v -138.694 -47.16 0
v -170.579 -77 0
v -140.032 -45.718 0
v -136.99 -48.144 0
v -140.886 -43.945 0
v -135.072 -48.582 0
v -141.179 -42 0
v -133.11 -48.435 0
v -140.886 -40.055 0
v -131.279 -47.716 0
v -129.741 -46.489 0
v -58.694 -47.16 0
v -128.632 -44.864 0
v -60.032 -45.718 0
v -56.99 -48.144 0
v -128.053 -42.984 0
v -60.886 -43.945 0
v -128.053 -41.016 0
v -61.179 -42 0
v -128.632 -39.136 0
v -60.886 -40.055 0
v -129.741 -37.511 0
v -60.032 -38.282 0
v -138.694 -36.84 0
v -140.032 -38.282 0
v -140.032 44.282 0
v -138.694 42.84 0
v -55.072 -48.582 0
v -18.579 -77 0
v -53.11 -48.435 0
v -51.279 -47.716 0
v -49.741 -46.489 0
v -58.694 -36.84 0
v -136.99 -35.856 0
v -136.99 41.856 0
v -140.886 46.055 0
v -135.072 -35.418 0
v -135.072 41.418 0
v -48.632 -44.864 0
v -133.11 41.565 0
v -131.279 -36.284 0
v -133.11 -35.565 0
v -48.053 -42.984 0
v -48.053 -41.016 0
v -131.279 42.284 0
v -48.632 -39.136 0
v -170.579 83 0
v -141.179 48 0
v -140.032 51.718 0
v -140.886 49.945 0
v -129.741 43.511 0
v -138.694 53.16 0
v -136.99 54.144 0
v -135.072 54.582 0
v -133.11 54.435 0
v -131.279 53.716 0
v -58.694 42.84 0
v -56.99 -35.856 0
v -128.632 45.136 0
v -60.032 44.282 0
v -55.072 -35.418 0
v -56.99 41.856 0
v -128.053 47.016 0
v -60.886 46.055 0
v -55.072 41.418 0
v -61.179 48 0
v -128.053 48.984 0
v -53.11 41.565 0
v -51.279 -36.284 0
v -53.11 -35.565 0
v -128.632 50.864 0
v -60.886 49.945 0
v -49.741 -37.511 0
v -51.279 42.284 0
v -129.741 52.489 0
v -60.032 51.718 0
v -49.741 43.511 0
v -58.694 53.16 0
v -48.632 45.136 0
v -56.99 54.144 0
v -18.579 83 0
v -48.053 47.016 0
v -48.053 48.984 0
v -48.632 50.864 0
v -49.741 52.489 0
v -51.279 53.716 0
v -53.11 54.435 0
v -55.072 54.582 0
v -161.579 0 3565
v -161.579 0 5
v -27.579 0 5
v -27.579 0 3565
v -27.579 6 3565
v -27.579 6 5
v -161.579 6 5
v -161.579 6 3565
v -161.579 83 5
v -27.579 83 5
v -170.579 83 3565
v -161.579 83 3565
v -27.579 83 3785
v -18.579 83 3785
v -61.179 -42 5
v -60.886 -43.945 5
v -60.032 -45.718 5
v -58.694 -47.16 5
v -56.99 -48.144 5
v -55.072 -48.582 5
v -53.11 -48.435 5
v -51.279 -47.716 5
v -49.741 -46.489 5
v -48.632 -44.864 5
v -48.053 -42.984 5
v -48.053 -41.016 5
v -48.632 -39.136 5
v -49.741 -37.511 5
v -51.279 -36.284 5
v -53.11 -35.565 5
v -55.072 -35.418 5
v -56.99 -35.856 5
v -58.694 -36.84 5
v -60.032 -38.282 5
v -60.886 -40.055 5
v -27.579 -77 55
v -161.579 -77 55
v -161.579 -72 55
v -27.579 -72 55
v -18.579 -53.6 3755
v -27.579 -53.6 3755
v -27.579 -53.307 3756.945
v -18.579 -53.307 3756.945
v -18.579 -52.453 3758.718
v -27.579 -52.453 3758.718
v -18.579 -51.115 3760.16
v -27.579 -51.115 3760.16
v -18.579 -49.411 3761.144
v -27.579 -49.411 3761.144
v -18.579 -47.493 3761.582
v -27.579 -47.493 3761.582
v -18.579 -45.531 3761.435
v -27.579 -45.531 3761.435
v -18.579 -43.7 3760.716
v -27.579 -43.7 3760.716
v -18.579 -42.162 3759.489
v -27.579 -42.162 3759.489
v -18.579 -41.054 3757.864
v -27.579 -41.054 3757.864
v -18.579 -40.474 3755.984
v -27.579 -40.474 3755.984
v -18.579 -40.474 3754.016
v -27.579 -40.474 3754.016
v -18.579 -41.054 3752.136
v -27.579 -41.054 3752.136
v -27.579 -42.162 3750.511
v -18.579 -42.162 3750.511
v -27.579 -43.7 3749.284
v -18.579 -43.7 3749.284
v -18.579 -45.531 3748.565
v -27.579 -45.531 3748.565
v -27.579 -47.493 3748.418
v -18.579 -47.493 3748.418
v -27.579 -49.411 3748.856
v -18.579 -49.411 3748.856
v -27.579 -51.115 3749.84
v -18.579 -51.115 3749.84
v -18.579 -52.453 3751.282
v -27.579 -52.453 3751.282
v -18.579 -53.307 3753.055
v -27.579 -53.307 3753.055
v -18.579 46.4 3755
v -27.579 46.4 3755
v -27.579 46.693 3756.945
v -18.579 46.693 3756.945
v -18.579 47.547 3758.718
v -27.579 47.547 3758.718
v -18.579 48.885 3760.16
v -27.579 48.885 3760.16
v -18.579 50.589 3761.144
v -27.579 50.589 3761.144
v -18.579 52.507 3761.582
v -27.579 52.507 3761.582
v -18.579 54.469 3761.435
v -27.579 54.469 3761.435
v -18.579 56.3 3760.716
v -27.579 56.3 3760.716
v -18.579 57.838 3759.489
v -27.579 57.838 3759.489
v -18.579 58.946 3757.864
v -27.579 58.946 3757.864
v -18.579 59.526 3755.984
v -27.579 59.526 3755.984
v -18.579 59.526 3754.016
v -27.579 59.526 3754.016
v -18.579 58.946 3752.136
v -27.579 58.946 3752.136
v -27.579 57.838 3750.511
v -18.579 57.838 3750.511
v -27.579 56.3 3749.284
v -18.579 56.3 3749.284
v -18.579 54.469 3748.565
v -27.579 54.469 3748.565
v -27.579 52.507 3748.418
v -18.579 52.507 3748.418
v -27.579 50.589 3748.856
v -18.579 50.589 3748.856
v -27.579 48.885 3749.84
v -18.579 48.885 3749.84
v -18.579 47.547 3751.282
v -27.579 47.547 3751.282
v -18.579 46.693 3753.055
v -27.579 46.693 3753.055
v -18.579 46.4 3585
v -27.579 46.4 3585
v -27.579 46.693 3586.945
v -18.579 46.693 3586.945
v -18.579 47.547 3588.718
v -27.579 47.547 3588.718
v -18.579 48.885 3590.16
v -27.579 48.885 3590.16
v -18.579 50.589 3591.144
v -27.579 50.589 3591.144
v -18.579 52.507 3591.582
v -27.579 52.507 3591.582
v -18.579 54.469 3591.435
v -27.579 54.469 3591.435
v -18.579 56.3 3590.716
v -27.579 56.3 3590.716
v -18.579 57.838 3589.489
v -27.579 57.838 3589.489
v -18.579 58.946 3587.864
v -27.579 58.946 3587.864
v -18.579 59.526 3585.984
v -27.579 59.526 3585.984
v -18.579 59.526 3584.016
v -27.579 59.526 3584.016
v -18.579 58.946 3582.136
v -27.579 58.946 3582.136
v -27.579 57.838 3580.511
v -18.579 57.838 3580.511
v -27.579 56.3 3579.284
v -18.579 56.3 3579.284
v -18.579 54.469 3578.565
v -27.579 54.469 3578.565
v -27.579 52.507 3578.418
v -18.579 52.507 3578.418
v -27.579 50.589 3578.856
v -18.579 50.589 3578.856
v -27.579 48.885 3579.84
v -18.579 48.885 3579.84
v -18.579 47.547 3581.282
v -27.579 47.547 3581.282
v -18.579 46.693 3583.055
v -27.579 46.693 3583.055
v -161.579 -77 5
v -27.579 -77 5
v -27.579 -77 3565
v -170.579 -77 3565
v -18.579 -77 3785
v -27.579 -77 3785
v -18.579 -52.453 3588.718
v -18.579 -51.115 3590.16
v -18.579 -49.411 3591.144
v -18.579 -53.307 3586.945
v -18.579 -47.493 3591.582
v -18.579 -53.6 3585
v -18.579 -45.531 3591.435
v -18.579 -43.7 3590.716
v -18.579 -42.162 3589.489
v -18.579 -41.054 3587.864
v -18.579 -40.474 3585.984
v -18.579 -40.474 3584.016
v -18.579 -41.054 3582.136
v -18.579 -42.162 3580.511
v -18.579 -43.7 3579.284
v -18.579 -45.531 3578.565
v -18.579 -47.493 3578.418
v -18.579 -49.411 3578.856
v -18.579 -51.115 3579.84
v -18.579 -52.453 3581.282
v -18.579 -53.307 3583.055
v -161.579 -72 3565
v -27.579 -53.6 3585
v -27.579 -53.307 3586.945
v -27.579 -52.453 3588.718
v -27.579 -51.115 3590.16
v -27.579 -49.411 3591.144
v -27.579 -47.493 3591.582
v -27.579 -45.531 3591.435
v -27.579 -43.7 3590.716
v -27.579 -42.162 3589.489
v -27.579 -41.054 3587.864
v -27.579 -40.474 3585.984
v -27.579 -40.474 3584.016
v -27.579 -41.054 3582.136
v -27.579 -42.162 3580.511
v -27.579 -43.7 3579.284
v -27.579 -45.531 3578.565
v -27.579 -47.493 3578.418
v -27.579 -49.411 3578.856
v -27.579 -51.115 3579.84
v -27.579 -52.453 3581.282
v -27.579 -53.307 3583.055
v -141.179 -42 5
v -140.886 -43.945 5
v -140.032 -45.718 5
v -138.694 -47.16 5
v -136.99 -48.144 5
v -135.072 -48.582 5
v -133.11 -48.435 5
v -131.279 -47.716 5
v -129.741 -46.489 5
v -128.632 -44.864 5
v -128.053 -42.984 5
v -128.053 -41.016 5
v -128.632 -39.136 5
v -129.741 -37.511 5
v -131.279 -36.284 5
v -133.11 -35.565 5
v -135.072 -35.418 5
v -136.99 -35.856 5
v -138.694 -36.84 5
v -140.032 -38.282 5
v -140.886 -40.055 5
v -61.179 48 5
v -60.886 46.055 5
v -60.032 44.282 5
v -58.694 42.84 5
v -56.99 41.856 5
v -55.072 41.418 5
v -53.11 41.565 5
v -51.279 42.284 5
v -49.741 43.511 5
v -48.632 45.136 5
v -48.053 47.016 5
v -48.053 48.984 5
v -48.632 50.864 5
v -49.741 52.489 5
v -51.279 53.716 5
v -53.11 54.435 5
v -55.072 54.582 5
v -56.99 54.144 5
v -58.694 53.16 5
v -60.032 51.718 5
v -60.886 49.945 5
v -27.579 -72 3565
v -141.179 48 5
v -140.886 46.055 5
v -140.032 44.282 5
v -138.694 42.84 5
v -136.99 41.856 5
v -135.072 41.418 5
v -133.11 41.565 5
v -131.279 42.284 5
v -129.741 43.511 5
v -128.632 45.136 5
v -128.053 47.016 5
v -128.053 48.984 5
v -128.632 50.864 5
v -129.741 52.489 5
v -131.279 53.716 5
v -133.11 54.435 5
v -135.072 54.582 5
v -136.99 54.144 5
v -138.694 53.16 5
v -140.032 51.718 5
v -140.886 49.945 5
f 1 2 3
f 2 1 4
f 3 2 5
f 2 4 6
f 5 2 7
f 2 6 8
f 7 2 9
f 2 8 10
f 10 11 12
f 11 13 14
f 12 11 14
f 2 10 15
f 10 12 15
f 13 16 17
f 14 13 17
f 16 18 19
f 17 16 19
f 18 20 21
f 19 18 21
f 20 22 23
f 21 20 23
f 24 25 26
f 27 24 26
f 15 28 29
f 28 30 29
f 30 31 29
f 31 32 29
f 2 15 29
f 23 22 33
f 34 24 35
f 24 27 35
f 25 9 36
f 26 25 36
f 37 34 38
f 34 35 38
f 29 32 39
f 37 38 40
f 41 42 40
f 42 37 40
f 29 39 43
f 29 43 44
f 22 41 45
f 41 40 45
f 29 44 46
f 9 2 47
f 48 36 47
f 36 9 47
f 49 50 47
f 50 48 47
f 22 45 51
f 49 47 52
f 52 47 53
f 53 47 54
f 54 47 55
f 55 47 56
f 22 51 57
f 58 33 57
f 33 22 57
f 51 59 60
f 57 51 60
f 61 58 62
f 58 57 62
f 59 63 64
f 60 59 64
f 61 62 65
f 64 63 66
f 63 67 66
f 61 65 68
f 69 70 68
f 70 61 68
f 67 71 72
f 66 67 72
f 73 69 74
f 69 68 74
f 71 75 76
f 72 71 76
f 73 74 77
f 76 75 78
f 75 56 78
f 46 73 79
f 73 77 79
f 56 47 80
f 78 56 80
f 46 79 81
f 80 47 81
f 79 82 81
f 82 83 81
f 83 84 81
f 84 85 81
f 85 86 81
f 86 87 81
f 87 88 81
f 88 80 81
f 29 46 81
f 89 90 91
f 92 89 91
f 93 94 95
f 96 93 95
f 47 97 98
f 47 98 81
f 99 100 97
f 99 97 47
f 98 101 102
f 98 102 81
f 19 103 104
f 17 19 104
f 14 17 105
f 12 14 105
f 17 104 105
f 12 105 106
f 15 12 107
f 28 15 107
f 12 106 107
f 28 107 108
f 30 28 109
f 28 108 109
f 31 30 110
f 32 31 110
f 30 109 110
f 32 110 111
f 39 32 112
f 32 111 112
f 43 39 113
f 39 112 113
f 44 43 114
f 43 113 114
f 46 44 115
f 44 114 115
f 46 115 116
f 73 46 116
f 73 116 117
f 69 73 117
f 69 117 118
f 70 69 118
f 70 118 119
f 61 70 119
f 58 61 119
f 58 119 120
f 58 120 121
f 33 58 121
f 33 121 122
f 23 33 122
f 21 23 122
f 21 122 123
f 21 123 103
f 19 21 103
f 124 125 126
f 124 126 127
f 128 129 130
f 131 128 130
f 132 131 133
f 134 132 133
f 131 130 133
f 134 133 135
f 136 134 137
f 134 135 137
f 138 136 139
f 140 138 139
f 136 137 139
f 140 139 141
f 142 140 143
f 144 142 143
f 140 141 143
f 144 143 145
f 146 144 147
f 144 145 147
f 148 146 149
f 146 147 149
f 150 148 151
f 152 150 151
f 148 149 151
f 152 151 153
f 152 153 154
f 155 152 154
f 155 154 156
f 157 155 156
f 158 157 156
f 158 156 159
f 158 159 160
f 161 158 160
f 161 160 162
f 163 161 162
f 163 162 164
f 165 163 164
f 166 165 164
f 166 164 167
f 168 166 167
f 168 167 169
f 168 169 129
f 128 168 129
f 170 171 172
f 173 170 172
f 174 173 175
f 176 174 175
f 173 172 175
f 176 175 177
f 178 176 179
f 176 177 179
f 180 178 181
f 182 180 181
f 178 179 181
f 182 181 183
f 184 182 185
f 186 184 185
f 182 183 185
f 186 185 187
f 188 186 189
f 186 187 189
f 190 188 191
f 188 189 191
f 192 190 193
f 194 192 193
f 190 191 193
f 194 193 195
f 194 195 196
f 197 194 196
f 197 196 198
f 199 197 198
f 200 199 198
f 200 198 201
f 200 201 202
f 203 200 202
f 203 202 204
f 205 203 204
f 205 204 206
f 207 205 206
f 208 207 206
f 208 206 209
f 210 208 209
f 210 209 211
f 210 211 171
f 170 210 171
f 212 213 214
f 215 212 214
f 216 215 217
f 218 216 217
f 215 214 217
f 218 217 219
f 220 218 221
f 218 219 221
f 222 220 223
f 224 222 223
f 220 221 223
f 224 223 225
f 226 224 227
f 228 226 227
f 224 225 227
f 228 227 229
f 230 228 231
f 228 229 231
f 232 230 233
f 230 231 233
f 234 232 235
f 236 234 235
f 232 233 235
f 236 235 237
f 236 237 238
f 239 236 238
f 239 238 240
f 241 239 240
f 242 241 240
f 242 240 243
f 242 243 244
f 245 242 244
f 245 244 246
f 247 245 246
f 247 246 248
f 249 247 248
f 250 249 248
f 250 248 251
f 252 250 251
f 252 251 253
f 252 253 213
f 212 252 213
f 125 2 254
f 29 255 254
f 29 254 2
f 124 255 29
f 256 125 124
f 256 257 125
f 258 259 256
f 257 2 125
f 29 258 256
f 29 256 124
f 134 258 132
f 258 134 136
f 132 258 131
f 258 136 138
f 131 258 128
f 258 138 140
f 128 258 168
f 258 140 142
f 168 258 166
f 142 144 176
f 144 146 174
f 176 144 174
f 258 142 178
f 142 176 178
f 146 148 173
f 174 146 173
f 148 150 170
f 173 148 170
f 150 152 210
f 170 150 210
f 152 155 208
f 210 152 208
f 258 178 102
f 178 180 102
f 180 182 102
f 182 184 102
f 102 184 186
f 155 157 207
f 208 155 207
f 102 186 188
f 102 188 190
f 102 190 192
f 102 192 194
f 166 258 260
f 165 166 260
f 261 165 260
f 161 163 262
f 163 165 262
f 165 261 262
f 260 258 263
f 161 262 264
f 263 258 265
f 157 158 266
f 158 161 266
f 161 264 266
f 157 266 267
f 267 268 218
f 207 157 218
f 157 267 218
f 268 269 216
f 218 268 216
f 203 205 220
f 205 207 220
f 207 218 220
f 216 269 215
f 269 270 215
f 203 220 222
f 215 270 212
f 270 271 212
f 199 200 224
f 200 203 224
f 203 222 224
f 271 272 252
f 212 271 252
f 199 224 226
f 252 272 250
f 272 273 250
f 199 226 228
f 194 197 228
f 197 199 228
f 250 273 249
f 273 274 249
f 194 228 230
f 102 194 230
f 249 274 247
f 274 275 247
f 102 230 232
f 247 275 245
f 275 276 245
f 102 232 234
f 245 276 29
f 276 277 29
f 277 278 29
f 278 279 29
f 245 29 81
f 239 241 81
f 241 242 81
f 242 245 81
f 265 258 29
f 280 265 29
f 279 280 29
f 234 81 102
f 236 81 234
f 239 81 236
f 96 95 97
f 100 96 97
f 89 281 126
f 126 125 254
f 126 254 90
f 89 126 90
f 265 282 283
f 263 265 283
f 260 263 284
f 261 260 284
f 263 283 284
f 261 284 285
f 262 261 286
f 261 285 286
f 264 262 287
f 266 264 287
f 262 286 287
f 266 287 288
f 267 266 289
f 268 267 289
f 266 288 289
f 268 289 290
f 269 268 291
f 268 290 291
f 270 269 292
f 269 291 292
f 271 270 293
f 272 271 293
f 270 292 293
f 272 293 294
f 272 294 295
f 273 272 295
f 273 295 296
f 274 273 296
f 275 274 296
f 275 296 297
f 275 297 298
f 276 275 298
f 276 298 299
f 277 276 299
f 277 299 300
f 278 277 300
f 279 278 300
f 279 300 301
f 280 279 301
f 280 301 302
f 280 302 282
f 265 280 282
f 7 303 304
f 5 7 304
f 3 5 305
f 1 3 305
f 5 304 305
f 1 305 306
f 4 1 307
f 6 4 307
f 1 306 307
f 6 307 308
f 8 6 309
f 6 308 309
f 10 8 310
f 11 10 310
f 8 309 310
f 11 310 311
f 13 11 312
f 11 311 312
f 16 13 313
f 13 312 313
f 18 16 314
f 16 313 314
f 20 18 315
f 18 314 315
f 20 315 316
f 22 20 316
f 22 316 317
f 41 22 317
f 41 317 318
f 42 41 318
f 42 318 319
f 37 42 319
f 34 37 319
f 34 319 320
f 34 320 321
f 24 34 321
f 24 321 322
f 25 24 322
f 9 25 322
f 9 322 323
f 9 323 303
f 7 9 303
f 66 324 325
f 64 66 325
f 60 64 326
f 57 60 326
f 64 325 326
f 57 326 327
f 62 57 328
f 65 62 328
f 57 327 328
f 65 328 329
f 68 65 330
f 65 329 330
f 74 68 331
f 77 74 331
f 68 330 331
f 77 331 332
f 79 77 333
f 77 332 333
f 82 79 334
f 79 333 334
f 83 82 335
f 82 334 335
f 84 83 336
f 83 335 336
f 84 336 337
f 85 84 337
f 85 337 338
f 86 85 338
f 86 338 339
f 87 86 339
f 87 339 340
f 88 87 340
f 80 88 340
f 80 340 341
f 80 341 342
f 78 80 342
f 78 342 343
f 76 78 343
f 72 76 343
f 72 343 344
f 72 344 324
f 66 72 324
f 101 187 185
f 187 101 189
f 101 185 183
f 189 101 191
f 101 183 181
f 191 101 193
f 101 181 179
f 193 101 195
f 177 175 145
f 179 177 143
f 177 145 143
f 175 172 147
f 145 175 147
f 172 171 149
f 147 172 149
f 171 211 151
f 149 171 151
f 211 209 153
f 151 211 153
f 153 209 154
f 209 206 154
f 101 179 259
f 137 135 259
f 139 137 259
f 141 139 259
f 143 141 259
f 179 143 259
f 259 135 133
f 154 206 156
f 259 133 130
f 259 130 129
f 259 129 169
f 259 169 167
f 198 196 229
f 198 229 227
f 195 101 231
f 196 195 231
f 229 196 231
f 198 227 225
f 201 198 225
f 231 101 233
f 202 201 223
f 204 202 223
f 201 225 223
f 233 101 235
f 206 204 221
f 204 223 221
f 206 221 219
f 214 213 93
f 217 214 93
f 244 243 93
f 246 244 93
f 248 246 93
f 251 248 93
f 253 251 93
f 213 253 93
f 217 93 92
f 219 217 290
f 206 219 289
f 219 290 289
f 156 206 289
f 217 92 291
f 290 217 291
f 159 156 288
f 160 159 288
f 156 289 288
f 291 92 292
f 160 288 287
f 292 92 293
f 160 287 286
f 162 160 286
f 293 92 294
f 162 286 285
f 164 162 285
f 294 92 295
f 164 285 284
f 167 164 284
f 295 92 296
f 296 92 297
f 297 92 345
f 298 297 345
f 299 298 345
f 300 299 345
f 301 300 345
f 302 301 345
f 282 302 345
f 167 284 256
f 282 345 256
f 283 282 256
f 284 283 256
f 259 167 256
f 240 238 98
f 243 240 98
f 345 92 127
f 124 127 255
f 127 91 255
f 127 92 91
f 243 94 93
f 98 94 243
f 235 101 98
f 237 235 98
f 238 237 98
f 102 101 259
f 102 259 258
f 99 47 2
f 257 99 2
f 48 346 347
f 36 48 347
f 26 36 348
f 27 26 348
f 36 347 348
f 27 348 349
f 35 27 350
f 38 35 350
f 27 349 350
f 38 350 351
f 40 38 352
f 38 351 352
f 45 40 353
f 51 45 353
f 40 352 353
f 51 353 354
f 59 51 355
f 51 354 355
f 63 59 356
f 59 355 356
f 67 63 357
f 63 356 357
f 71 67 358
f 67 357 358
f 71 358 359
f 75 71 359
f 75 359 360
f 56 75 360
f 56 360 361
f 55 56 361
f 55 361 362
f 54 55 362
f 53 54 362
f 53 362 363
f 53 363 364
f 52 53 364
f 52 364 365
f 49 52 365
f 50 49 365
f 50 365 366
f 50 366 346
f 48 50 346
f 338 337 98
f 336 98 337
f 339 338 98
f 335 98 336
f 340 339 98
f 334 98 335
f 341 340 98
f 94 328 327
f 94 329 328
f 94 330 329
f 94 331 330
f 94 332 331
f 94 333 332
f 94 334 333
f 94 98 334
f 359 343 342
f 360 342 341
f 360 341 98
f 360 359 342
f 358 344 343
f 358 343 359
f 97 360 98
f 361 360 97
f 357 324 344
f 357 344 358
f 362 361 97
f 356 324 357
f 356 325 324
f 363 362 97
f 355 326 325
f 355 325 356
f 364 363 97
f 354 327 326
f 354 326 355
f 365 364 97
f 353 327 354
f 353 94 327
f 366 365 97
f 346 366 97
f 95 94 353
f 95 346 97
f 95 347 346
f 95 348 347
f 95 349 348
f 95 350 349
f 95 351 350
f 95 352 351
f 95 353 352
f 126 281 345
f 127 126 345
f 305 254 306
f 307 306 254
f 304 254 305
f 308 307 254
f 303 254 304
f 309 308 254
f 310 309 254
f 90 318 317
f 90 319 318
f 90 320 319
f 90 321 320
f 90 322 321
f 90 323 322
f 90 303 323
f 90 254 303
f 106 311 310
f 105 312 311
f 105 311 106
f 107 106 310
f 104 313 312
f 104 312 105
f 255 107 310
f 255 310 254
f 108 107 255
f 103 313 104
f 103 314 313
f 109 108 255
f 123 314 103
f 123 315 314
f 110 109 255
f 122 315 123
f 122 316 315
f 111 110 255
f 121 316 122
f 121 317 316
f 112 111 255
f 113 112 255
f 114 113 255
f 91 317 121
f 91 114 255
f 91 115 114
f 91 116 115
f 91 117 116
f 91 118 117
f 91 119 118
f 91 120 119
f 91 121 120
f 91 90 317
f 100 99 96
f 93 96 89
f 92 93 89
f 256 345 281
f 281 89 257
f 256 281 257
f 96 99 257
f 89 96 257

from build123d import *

# Parameters (mm, degrees)
F1_DEPTH  = 3785
F2_W      = 134
F2_H      = 220
F3_DEPTH  = 100
F4_W      = 160
F4_H      = 220
F5_DEPTH  = 25
F7_D      = 13.2
F8_W      = 134
F8_H      = 5
F9_DEPTH  = 77
F10_W     = 134
F10_H     = 5
F11_DEPTH = 77
F13_D     = 13.2
F14_W     = 134
F14_H     = 3510
F15_DEPTH = 5


with BuildPart() as f1:
    # F0 (on Top) → F1 (new body)
    with BuildSketch(Plane.XY):
        Polygon((-170.5788427117, 83), (-170.5788427117, -77), (-161.5788427117, -77), (-161.5788427117, 0), (-27.5788427117, 0), (-27.5788427117, -77), (-18.5788427117, -77), (-18.5788427117, 83), (-27.5788427117, 83), (-27.5788427117, 6), (-161.5788427117, 6), (-161.5788427117, 83), align=None)
    extrude(amount=F1_DEPTH)

    # F2 (on face) → F3 (cut)
    with BuildSketch(Plane.XZ):
        with Locations((-94.5788427117, 3675)):
            Rectangle(F2_W, F2_H)
    extrude(amount=-F3_DEPTH, mode=Mode.SUBTRACT)

    # F4 (on face) → F5 (cut)
    with BuildSketch(Plane(origin=(-170.5788427117, 0, 0), x_dir=(0, -1, 0), z_dir=(-1, 0, 0))):
        with Locations((-3, 3675)):
            Rectangle(F4_W, F4_H)
    extrude(amount=-F5_DEPTH, mode=Mode.SUBTRACT)

    # F7 (through all)
    with Locations(Plane.YZ.offset(-18.5788427117)):
        with Locations((-47, 3755), (53, 3755), (-47, 3585), (53, 3585)):
            Hole(F7_D / 2)

    # F8 (on face) → F9 (join)
    with BuildSketch(Plane(origin=(0, 6, 0), x_dir=(-1, 0, 0), z_dir=(0, 1, 0))):
        with Locations((94.5788427117, 2.5)):
            Rectangle(F8_W, F8_H)
    extrude(amount=F9_DEPTH)

    # F10 (on face) → F11 (join)
    with BuildSketch(Plane.XZ):
        with Locations((-94.5788427117, 2.5)):
            Rectangle(F10_W, F10_H)
    extrude(amount=F11_DEPTH)

    # F13 (through all)
    with Locations(Plane(origin=(0, 0, 0), x_dir=(1, 0, 0), z_dir=(0, 0, -1))):
        with Locations((-54.5788427117, -48), (-54.5788427117, 42), (-134.5788427117, 42), (-134.5788427117, -48)):
            Hole(F13_D / 2)

    # F14 (on face) → F15 (join)
    with BuildSketch(Plane.XZ.offset(77)):
        with Locations((-94.5788427117, 1810)):
            Rectangle(F14_W, F14_H)
    extrude(amount=-F15_DEPTH)


solid = f1.part
